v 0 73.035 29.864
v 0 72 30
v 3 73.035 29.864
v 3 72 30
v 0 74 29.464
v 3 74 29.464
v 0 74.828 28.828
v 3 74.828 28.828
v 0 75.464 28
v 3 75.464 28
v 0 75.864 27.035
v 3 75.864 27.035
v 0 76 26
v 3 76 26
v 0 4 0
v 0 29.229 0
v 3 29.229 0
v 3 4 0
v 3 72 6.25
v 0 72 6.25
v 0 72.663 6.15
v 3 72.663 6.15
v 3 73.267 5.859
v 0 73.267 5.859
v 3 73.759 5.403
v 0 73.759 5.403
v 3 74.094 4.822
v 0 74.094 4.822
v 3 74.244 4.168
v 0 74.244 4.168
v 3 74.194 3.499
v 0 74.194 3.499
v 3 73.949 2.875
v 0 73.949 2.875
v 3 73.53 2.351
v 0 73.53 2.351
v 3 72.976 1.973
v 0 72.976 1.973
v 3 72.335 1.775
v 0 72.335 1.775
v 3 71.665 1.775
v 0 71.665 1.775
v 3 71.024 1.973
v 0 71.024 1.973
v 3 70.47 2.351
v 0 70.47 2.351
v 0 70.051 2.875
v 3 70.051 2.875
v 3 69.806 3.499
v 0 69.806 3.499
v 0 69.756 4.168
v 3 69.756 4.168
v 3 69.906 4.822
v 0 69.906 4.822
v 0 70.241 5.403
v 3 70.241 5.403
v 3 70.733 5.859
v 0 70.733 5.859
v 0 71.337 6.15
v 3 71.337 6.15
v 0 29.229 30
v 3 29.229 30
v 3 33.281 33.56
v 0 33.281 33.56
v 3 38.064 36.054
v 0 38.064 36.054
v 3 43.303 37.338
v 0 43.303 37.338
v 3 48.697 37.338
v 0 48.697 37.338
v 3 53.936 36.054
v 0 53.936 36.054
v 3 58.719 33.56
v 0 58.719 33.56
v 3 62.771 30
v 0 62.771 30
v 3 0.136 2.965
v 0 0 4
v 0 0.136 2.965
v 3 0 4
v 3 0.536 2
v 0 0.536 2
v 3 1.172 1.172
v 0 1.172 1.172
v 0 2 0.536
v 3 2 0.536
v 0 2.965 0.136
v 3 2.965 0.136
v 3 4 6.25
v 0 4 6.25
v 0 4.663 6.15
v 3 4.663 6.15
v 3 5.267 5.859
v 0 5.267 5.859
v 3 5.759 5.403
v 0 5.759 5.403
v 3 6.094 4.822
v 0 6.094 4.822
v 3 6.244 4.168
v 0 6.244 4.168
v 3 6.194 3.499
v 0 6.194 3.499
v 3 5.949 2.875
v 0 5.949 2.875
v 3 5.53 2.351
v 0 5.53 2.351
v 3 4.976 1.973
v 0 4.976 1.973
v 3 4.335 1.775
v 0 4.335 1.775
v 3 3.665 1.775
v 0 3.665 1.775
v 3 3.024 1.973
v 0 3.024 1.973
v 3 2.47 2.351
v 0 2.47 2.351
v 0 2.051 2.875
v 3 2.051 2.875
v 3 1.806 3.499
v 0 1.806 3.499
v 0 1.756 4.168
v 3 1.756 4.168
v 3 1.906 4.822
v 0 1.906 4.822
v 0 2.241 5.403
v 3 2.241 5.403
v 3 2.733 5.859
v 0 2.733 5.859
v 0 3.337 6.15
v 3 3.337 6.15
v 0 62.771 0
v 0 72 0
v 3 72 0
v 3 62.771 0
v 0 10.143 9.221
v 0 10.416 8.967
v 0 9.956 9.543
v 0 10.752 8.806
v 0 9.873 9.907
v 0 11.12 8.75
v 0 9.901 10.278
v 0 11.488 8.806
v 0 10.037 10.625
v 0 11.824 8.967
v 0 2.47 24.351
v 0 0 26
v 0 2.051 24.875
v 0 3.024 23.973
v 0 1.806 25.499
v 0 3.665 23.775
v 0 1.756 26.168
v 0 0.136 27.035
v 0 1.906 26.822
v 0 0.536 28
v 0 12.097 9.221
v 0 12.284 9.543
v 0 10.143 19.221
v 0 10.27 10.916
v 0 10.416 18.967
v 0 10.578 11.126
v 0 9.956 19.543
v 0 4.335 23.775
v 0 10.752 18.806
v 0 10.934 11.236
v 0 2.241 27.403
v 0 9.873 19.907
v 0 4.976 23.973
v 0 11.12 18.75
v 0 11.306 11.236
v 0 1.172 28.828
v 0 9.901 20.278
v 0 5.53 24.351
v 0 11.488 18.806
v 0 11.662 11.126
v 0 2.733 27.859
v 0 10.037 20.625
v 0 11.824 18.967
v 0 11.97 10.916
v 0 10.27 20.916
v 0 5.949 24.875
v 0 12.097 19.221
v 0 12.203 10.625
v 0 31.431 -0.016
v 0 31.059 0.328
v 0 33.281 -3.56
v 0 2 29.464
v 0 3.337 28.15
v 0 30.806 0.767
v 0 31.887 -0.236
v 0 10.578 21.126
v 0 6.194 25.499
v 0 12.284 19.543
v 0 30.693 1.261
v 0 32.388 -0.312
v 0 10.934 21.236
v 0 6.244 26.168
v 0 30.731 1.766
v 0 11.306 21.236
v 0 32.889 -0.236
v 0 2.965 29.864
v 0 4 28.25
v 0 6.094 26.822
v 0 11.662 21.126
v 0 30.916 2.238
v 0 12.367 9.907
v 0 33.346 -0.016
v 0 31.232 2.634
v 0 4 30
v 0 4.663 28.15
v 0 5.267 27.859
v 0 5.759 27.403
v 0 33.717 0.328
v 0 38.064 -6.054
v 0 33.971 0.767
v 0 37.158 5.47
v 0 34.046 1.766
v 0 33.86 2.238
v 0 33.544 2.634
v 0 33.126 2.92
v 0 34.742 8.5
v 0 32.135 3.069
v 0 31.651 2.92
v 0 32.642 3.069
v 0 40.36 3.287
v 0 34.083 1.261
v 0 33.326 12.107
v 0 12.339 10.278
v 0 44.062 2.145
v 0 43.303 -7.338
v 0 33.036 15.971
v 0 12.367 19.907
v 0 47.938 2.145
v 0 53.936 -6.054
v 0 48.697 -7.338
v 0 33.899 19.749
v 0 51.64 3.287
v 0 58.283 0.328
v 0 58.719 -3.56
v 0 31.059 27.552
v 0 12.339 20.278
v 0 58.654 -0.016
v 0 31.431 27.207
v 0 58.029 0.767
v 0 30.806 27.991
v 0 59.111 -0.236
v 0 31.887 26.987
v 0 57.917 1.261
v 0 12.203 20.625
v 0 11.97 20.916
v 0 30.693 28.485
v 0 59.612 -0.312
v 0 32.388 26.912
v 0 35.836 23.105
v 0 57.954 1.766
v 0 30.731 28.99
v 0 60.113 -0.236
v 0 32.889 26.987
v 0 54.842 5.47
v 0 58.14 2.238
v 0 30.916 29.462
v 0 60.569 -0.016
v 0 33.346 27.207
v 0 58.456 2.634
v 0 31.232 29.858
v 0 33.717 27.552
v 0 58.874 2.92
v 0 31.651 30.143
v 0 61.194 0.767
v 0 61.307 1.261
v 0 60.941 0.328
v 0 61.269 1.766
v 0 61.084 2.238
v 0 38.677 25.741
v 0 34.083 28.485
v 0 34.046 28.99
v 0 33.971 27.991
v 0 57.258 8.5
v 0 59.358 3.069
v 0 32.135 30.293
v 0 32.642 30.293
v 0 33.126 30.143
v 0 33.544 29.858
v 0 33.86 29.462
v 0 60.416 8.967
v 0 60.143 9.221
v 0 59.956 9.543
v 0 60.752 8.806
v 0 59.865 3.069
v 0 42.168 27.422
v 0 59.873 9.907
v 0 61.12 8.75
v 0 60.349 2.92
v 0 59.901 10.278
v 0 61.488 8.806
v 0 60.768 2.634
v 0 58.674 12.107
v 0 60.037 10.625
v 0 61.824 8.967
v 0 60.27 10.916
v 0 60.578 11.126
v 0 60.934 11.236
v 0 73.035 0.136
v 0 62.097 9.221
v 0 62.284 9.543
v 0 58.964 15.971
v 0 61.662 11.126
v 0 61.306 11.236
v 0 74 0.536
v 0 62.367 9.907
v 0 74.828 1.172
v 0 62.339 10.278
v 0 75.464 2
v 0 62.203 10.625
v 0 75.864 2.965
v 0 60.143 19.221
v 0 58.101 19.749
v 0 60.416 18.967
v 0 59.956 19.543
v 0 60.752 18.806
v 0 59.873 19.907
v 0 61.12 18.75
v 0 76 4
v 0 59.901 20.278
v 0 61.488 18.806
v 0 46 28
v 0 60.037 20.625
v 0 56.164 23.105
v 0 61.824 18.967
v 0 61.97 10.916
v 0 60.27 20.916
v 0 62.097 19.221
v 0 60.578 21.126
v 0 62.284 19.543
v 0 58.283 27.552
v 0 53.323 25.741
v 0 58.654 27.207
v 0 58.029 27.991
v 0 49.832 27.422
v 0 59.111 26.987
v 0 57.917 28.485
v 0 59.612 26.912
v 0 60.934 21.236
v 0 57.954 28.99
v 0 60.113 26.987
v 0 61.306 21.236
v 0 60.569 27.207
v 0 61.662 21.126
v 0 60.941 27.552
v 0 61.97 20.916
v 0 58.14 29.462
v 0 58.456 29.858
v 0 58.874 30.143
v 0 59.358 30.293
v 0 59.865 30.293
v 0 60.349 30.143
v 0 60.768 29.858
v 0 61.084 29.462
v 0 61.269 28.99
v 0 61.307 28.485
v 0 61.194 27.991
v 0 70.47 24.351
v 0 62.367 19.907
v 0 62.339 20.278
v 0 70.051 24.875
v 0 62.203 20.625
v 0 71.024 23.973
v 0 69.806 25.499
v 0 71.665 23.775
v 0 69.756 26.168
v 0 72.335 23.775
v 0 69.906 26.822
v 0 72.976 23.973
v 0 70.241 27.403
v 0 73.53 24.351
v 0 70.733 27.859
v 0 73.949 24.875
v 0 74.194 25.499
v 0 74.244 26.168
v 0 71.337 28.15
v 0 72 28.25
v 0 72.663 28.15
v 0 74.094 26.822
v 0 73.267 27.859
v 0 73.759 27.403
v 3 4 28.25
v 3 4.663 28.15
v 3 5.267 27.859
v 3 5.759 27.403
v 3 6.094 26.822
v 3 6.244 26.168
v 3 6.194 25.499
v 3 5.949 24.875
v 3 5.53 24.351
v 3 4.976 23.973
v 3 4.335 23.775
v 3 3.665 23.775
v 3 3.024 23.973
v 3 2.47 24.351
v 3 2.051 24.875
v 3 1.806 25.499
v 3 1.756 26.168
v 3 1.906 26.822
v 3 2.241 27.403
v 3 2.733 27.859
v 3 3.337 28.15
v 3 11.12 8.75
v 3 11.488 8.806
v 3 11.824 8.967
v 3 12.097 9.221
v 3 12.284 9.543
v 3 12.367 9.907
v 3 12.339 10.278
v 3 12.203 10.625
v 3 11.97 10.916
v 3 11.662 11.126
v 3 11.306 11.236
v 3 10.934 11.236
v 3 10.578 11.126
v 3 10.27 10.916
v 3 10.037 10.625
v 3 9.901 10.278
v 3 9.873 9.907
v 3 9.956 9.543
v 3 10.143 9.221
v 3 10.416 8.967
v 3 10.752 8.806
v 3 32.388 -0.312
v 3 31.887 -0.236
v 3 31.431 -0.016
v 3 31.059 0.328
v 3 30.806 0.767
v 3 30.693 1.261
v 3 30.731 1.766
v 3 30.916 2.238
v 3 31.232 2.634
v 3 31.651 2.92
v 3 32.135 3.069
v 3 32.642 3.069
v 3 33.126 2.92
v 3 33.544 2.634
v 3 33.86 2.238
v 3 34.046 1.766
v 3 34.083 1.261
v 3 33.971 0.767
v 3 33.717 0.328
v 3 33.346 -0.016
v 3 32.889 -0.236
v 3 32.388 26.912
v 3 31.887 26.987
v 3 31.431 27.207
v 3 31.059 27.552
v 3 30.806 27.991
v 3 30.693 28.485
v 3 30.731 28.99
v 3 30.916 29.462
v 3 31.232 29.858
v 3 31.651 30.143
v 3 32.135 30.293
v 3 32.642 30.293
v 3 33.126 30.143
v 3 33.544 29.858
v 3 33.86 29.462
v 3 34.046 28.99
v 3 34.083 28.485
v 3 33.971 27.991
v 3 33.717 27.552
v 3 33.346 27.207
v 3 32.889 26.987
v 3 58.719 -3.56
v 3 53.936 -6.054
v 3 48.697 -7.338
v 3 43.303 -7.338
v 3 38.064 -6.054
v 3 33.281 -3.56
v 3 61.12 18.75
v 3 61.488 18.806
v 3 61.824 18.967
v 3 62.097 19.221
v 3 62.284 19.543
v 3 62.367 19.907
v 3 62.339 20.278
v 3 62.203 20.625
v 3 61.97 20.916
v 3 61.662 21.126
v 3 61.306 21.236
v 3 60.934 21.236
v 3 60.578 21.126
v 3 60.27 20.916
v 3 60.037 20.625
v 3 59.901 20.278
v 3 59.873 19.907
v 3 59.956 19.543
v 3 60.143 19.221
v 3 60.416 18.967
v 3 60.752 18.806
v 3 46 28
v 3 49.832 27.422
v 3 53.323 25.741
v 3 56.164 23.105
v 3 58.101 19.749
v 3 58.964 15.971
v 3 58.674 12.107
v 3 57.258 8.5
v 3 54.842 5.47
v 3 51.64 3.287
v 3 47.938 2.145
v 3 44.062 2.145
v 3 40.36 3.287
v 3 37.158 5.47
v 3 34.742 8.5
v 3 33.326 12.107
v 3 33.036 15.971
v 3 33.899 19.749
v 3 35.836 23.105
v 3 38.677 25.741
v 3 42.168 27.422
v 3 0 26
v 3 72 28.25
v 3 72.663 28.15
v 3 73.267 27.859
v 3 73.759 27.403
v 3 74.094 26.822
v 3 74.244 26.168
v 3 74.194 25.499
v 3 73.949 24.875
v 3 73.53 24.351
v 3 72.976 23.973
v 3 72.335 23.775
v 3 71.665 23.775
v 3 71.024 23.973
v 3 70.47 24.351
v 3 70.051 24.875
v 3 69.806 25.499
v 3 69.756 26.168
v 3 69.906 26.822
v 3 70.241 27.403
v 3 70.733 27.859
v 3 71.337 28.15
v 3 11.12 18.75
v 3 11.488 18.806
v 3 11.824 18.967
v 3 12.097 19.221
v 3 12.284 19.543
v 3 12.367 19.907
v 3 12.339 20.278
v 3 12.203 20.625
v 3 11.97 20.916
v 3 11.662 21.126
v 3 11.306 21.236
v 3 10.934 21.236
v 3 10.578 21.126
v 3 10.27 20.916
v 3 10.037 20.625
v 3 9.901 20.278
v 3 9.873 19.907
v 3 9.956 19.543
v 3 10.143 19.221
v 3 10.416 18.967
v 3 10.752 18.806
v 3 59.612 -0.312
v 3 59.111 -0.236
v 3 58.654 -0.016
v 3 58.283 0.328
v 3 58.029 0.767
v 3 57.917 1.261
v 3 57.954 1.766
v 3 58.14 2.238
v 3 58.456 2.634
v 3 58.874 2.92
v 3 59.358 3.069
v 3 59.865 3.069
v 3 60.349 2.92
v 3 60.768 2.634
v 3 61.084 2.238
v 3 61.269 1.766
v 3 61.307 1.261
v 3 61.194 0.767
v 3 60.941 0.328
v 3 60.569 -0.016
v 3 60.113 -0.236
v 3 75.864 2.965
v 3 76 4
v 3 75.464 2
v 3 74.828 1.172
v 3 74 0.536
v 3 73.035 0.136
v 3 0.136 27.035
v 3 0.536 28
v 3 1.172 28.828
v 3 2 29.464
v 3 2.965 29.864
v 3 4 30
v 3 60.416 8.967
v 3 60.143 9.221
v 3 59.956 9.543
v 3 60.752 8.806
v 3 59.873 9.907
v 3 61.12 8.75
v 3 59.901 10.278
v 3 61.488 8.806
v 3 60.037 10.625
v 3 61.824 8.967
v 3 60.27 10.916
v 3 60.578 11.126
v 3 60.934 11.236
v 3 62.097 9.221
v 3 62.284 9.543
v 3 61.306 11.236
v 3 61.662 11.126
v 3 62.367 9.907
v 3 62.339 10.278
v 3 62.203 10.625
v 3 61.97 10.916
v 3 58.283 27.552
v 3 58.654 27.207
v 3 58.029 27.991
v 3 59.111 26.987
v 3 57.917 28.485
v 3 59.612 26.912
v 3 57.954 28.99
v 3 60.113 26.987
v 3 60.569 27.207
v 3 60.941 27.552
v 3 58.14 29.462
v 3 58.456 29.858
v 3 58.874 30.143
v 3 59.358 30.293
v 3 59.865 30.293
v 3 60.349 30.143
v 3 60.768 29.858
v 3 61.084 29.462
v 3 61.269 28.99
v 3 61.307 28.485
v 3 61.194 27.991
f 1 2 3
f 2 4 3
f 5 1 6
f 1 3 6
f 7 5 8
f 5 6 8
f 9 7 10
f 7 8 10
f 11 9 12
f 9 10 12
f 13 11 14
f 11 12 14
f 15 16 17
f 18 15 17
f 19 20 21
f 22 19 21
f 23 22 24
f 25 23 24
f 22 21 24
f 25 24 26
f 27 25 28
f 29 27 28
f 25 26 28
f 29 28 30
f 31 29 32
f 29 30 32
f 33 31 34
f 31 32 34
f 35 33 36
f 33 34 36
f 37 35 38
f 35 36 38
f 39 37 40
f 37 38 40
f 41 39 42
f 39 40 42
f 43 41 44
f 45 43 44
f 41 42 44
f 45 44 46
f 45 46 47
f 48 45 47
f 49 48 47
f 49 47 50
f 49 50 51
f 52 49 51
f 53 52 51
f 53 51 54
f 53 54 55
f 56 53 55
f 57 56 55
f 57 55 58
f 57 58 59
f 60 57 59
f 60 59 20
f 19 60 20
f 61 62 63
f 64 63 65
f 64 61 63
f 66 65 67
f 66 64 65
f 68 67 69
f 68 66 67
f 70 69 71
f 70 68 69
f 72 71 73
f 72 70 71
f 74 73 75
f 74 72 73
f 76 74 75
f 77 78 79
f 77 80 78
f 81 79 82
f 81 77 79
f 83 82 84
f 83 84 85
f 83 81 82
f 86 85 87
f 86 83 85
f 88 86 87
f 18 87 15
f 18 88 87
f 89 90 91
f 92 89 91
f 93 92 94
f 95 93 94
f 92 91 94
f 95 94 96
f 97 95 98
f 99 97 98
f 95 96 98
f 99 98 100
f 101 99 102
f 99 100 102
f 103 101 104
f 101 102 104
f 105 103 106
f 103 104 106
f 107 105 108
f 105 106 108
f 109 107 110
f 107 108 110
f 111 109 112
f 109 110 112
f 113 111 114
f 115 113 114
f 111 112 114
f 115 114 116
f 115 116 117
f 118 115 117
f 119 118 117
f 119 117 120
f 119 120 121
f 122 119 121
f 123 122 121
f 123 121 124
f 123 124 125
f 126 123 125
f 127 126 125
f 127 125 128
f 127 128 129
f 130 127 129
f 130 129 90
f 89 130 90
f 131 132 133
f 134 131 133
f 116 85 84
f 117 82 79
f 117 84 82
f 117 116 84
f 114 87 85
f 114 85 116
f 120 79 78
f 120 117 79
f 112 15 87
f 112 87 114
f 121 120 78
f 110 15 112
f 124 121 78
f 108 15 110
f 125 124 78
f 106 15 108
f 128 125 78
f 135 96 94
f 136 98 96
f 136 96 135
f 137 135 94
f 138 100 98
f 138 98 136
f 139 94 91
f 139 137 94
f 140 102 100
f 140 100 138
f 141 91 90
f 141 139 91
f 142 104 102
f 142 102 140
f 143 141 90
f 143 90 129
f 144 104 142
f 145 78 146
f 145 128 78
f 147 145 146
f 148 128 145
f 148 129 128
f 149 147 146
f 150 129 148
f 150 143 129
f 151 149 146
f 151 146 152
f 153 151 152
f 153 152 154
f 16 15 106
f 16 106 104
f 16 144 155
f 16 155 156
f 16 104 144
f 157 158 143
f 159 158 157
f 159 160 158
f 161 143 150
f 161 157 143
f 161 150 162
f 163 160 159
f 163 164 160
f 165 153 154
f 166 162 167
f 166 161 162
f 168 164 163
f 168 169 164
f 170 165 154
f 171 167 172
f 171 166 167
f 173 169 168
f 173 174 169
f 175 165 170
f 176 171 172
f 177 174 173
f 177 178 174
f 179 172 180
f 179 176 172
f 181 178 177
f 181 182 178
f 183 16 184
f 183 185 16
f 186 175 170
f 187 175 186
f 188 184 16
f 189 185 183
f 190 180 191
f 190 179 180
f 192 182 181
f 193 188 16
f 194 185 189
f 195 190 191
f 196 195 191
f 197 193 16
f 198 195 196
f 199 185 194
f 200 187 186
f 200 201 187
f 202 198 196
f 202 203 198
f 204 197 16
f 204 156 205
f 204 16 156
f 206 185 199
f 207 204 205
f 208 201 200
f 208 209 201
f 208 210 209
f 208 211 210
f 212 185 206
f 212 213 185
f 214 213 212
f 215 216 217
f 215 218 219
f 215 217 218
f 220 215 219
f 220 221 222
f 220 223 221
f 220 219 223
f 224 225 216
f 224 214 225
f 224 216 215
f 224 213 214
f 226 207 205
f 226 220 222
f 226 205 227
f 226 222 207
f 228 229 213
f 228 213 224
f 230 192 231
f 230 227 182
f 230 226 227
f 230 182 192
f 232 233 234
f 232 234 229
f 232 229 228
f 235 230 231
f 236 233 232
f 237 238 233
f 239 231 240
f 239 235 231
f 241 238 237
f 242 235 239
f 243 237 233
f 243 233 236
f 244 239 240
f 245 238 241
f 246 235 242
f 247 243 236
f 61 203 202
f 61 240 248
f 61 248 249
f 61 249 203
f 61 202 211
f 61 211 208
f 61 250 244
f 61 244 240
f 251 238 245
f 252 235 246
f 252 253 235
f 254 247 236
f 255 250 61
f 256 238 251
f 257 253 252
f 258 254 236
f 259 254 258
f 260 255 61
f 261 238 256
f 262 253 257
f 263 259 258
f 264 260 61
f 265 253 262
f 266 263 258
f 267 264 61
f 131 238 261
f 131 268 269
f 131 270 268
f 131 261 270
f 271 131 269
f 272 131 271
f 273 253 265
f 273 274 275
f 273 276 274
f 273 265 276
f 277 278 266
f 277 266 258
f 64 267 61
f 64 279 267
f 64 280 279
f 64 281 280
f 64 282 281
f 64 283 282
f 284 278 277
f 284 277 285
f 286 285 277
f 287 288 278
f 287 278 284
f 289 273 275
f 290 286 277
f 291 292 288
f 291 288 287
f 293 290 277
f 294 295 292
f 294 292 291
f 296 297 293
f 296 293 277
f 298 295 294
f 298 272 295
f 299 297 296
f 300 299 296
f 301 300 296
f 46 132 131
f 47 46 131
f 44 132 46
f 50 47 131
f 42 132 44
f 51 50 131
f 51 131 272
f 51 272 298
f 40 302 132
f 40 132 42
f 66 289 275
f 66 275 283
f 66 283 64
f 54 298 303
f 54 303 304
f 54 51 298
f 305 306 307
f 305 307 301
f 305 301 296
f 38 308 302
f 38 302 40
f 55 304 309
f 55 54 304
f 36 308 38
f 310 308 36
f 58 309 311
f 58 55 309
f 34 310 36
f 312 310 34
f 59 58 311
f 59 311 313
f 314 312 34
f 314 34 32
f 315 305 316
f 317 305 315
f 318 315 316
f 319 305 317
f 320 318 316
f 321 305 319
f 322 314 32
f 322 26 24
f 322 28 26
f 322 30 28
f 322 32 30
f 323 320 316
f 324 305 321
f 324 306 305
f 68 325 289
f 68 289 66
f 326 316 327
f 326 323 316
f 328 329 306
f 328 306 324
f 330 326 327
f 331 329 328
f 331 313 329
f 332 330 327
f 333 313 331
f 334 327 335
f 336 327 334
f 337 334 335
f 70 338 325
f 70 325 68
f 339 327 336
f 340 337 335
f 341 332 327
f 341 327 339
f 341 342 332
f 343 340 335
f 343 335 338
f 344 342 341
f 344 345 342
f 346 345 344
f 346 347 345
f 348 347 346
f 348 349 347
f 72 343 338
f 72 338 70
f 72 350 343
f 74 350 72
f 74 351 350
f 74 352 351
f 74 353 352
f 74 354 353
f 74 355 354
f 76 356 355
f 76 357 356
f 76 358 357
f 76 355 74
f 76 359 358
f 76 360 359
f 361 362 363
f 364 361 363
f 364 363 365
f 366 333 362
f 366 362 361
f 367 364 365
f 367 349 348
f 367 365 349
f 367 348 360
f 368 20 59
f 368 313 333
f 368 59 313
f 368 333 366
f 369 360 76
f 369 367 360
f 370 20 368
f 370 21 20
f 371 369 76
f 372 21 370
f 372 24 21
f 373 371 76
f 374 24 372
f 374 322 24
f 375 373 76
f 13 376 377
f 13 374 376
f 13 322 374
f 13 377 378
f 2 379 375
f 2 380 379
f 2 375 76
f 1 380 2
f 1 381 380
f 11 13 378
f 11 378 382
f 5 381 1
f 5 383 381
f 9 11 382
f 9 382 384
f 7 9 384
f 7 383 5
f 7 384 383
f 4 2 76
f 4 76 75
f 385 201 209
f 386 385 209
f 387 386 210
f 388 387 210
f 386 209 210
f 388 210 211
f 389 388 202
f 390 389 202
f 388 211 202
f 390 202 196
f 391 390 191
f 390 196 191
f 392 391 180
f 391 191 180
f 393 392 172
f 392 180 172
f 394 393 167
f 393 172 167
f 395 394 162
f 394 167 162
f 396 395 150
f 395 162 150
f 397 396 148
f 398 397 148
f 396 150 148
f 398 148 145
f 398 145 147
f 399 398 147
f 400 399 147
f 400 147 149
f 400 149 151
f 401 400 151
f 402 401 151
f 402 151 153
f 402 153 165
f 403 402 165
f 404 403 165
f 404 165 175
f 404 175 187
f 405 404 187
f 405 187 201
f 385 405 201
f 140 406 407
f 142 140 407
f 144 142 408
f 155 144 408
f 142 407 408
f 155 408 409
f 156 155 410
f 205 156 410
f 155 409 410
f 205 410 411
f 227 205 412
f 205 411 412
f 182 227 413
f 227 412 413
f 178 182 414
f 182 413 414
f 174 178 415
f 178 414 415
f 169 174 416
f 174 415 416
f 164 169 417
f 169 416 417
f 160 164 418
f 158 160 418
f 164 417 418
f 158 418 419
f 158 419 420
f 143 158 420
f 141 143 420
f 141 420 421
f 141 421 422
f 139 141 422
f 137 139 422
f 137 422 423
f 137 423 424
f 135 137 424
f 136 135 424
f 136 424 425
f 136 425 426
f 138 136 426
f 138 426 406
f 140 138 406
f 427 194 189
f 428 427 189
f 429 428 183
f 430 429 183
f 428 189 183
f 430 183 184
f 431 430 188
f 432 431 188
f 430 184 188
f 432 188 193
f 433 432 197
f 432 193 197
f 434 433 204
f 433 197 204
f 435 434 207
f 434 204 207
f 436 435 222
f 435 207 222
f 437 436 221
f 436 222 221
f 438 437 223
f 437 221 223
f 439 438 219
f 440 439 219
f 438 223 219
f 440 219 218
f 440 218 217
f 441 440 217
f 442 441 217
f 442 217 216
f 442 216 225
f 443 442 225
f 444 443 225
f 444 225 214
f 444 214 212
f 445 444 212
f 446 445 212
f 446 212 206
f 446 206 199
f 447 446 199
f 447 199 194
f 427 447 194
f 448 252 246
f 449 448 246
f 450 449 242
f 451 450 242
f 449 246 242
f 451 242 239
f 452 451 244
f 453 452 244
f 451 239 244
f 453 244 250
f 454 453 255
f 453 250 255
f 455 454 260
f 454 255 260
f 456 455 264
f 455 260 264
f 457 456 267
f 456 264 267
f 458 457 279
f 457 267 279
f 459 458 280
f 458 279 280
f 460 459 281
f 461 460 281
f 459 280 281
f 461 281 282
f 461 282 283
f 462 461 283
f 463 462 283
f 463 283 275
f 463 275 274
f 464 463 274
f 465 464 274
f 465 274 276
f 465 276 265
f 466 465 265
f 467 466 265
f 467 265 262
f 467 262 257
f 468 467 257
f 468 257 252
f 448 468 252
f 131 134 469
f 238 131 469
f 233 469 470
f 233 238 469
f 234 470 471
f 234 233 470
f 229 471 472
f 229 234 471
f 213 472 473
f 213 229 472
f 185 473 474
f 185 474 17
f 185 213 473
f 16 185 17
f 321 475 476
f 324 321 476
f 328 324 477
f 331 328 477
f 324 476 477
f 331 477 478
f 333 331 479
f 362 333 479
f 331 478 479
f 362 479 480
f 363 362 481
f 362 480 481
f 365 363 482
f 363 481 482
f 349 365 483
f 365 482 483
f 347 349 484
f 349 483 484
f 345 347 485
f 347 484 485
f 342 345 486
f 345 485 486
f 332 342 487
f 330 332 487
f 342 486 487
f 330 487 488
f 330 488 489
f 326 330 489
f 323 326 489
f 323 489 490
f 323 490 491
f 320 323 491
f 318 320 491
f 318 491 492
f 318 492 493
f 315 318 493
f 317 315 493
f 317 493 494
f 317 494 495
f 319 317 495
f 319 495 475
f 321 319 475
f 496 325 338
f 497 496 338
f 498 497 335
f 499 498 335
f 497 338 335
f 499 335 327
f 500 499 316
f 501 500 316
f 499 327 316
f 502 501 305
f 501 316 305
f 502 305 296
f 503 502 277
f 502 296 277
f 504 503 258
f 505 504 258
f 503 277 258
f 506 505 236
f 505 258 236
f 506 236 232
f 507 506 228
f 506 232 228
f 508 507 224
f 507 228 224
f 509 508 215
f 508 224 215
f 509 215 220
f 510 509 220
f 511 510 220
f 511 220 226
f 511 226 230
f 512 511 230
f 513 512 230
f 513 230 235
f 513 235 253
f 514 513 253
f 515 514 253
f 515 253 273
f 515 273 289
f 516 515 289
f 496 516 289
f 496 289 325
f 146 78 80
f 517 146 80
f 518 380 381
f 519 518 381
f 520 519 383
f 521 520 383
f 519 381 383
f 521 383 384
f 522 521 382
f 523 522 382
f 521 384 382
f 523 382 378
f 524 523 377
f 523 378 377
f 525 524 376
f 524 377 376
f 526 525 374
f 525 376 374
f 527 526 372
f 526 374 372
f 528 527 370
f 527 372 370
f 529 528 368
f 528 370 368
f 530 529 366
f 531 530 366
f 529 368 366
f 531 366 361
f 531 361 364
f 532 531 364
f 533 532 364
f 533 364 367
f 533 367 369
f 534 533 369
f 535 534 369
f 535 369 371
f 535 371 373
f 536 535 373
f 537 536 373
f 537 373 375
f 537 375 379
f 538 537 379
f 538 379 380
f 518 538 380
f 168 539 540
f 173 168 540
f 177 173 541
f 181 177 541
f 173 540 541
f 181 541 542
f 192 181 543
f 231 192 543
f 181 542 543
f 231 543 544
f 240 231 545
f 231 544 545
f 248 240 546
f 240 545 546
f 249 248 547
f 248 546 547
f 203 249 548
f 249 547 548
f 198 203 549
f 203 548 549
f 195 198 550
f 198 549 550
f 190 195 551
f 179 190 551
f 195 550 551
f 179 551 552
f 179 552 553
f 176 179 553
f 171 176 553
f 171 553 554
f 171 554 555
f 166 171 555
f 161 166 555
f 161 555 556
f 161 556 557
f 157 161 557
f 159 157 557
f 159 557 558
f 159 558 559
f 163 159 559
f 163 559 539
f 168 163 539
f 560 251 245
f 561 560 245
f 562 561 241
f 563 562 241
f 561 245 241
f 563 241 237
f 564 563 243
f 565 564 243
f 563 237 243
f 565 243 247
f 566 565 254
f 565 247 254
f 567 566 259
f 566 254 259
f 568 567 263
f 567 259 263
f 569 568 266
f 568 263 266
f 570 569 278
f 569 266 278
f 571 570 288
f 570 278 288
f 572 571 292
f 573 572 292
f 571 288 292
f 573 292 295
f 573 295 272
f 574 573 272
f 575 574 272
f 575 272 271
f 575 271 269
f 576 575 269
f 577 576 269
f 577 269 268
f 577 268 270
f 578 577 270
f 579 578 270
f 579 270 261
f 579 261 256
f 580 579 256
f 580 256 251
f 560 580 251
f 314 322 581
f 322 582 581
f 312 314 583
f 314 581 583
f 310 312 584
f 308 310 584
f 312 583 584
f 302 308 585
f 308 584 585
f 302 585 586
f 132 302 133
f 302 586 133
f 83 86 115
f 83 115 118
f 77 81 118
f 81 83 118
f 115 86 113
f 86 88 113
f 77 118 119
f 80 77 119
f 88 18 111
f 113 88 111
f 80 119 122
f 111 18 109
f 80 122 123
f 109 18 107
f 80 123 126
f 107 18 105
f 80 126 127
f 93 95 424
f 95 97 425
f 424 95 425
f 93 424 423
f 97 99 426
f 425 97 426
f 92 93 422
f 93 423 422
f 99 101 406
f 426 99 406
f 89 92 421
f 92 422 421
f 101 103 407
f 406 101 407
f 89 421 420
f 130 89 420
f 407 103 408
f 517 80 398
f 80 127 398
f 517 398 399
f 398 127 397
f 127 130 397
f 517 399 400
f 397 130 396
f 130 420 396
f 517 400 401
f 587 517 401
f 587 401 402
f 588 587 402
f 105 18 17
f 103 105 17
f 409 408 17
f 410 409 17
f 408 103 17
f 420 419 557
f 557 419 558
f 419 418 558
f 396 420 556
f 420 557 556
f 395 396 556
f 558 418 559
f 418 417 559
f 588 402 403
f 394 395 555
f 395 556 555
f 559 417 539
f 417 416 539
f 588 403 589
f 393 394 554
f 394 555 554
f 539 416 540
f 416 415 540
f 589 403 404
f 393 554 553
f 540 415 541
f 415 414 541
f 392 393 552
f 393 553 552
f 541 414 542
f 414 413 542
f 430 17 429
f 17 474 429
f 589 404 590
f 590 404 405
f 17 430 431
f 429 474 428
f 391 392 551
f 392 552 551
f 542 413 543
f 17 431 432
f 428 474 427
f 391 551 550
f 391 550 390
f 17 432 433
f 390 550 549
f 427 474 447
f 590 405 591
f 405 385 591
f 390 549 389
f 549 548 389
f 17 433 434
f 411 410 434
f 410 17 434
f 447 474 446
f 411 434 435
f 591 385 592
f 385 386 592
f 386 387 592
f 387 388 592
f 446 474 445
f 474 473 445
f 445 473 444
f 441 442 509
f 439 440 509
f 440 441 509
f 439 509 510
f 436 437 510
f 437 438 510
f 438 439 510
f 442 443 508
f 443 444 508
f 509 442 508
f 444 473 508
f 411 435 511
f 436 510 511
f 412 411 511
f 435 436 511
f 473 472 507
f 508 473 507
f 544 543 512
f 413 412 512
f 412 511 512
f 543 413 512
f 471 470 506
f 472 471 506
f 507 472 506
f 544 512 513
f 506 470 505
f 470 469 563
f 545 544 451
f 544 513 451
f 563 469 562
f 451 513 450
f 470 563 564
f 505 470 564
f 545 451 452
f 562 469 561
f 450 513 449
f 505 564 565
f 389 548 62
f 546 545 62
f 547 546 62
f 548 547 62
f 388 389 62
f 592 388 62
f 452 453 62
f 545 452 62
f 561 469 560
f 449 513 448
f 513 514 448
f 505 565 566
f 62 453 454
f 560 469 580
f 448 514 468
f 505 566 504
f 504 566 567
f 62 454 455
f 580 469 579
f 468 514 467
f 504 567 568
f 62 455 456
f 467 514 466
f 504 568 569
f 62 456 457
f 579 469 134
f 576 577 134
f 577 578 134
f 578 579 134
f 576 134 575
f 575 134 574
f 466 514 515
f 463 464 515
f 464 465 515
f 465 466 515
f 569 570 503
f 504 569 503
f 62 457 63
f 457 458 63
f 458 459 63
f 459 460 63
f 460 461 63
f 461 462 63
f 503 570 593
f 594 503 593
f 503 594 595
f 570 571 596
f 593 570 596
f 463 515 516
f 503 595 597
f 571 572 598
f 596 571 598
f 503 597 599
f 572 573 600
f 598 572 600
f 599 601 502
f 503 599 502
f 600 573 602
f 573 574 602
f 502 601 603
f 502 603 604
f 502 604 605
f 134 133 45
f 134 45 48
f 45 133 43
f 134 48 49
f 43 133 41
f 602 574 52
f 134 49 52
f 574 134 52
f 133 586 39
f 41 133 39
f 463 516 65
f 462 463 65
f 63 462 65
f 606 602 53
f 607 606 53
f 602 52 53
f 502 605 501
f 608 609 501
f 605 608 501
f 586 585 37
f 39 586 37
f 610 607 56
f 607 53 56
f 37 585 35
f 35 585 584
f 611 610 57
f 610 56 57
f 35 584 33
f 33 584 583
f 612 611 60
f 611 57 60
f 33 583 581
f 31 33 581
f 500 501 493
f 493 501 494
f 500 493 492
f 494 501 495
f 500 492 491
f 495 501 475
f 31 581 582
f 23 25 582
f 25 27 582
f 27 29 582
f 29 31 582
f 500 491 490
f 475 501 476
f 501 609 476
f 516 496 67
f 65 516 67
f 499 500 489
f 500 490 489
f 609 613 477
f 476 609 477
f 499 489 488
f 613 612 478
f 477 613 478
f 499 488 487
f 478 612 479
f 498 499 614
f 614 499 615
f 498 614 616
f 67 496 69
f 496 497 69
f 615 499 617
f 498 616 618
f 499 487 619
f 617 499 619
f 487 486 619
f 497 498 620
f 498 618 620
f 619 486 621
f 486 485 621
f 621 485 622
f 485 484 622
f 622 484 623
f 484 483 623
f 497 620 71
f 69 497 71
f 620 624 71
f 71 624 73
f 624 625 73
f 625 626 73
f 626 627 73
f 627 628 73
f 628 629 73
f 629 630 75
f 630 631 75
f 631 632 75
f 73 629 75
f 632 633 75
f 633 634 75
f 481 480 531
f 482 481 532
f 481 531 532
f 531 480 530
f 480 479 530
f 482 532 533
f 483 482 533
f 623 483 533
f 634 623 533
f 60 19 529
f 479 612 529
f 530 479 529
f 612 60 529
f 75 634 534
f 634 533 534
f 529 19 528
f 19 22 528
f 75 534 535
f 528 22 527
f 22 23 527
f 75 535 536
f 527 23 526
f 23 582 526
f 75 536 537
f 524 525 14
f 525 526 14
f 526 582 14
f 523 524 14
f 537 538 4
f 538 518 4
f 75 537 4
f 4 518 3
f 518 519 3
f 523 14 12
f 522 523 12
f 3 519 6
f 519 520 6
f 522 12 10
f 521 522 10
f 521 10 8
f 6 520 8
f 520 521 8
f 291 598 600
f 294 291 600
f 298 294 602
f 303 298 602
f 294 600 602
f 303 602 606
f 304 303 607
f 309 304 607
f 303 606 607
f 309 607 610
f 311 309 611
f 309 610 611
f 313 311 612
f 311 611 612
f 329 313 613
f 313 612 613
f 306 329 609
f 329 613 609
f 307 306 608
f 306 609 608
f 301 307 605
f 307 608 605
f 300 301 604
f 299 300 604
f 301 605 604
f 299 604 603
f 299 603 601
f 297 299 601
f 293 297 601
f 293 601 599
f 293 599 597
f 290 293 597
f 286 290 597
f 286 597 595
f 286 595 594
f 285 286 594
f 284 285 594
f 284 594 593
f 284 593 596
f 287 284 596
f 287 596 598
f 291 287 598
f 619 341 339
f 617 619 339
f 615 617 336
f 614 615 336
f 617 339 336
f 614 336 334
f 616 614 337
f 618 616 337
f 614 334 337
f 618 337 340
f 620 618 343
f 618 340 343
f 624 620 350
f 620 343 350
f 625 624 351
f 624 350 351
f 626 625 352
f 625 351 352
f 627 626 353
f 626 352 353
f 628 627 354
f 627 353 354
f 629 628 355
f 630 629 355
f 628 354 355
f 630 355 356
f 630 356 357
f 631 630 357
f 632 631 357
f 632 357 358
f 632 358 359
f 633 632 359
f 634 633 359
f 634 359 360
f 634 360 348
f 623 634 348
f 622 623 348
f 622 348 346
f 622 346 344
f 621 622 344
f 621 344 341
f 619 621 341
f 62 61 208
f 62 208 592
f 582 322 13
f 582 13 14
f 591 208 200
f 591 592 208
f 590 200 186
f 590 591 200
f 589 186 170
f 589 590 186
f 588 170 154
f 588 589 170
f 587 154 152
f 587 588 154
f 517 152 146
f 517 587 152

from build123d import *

# Parameters (mm, degrees)
SKETCH_1_W          = 3
SKETCH_1_H          = 30
EXTRUDE_1_DEPTH     = 76
SKETCH_2_R          = 22.5
EXTRUDE_2_DEPTH     = 3
SKETCH_3_R          = 13
CUT_EXTRUDE_1_DEPTH = 85.801238199
HOLE_WIZARD_M31_D   = 3.4
HOLE_WIZARD_M41_D   = 4.5
FILLET_1_R          = 4
M3X0_51_D           = 2.5


with BuildPart() as part:
    # Эскиз1 → Бобышка-Вытянуть1 (new body)
    with BuildSketch(Plane(origin=(0, 0, 0), x_dir=(1, 0, 0), z_dir=(0, 1, 0))):
        with Locations((1.5, -15)):
            Rectangle(SKETCH_1_W, SKETCH_1_H)
    extrude(amount=EXTRUDE_1_DEPTH)

    # Эскиз2 → Бобышка-Вытянуть2 (add)
    with BuildSketch(Plane.ZY):
        with Locations((15, 46)):
            Circle(SKETCH_2_R)
    extrude(amount=-EXTRUDE_2_DEPTH)

    # Эскиз3 → Вырез-Вытянуть1 (cut, through all)
    with BuildSketch(Plane.ZY):
        with Locations((15, 46)):
            Circle(SKETCH_3_R)
    extrude(amount=-CUT_EXTRUDE_1_DEPTH, mode=Mode.SUBTRACT)

    # Отверстие с зазором M31 (through all)
    with Locations(Plane(origin=(3, -25.024735225, 7.262908886), x_dir=(0, 0, 1), z_dir=(1, 0, 0))):
        with Locations((21.348896652, -84.636540763), (-5.874714424, -84.636540763), (-5.874714424, -57.412929688), (21.348896652, -57.412929688)):
            Hole(HOLE_WIZARD_M31_D / 2)

    # Отверстие с зазором M41 (through all)
    with Locations(Plane(origin=(3, 0, 0), x_dir=(0, 0, -1), z_dir=(1, 0, 0))):
        with Locations((-26, 72), (-4, 72), (-4, 4), (-26, 4)):
            Hole(HOLE_WIZARD_M41_D / 2)

    # Скругление1
    fillet_1_edges = [part.edges().sort_by_distance(p)[0] for p in [
        (1.5, 76, 0),
        (1.5, 0, 0),
        (1.5, 0, 30),
        (1.5, 76, 30),
    ]]
    fillet(fillet_1_edges, radius=FILLET_1_R)

    # Отверстие обработанное метчиком M3x0.51 (through all)
    with Locations(Plane.ZY):
        with Locations((10, 61.12), (20, 61.12), (10, 11.12), (20, 11.12)):
            Hole(M3X0_51_D / 2)


solid = part.part
